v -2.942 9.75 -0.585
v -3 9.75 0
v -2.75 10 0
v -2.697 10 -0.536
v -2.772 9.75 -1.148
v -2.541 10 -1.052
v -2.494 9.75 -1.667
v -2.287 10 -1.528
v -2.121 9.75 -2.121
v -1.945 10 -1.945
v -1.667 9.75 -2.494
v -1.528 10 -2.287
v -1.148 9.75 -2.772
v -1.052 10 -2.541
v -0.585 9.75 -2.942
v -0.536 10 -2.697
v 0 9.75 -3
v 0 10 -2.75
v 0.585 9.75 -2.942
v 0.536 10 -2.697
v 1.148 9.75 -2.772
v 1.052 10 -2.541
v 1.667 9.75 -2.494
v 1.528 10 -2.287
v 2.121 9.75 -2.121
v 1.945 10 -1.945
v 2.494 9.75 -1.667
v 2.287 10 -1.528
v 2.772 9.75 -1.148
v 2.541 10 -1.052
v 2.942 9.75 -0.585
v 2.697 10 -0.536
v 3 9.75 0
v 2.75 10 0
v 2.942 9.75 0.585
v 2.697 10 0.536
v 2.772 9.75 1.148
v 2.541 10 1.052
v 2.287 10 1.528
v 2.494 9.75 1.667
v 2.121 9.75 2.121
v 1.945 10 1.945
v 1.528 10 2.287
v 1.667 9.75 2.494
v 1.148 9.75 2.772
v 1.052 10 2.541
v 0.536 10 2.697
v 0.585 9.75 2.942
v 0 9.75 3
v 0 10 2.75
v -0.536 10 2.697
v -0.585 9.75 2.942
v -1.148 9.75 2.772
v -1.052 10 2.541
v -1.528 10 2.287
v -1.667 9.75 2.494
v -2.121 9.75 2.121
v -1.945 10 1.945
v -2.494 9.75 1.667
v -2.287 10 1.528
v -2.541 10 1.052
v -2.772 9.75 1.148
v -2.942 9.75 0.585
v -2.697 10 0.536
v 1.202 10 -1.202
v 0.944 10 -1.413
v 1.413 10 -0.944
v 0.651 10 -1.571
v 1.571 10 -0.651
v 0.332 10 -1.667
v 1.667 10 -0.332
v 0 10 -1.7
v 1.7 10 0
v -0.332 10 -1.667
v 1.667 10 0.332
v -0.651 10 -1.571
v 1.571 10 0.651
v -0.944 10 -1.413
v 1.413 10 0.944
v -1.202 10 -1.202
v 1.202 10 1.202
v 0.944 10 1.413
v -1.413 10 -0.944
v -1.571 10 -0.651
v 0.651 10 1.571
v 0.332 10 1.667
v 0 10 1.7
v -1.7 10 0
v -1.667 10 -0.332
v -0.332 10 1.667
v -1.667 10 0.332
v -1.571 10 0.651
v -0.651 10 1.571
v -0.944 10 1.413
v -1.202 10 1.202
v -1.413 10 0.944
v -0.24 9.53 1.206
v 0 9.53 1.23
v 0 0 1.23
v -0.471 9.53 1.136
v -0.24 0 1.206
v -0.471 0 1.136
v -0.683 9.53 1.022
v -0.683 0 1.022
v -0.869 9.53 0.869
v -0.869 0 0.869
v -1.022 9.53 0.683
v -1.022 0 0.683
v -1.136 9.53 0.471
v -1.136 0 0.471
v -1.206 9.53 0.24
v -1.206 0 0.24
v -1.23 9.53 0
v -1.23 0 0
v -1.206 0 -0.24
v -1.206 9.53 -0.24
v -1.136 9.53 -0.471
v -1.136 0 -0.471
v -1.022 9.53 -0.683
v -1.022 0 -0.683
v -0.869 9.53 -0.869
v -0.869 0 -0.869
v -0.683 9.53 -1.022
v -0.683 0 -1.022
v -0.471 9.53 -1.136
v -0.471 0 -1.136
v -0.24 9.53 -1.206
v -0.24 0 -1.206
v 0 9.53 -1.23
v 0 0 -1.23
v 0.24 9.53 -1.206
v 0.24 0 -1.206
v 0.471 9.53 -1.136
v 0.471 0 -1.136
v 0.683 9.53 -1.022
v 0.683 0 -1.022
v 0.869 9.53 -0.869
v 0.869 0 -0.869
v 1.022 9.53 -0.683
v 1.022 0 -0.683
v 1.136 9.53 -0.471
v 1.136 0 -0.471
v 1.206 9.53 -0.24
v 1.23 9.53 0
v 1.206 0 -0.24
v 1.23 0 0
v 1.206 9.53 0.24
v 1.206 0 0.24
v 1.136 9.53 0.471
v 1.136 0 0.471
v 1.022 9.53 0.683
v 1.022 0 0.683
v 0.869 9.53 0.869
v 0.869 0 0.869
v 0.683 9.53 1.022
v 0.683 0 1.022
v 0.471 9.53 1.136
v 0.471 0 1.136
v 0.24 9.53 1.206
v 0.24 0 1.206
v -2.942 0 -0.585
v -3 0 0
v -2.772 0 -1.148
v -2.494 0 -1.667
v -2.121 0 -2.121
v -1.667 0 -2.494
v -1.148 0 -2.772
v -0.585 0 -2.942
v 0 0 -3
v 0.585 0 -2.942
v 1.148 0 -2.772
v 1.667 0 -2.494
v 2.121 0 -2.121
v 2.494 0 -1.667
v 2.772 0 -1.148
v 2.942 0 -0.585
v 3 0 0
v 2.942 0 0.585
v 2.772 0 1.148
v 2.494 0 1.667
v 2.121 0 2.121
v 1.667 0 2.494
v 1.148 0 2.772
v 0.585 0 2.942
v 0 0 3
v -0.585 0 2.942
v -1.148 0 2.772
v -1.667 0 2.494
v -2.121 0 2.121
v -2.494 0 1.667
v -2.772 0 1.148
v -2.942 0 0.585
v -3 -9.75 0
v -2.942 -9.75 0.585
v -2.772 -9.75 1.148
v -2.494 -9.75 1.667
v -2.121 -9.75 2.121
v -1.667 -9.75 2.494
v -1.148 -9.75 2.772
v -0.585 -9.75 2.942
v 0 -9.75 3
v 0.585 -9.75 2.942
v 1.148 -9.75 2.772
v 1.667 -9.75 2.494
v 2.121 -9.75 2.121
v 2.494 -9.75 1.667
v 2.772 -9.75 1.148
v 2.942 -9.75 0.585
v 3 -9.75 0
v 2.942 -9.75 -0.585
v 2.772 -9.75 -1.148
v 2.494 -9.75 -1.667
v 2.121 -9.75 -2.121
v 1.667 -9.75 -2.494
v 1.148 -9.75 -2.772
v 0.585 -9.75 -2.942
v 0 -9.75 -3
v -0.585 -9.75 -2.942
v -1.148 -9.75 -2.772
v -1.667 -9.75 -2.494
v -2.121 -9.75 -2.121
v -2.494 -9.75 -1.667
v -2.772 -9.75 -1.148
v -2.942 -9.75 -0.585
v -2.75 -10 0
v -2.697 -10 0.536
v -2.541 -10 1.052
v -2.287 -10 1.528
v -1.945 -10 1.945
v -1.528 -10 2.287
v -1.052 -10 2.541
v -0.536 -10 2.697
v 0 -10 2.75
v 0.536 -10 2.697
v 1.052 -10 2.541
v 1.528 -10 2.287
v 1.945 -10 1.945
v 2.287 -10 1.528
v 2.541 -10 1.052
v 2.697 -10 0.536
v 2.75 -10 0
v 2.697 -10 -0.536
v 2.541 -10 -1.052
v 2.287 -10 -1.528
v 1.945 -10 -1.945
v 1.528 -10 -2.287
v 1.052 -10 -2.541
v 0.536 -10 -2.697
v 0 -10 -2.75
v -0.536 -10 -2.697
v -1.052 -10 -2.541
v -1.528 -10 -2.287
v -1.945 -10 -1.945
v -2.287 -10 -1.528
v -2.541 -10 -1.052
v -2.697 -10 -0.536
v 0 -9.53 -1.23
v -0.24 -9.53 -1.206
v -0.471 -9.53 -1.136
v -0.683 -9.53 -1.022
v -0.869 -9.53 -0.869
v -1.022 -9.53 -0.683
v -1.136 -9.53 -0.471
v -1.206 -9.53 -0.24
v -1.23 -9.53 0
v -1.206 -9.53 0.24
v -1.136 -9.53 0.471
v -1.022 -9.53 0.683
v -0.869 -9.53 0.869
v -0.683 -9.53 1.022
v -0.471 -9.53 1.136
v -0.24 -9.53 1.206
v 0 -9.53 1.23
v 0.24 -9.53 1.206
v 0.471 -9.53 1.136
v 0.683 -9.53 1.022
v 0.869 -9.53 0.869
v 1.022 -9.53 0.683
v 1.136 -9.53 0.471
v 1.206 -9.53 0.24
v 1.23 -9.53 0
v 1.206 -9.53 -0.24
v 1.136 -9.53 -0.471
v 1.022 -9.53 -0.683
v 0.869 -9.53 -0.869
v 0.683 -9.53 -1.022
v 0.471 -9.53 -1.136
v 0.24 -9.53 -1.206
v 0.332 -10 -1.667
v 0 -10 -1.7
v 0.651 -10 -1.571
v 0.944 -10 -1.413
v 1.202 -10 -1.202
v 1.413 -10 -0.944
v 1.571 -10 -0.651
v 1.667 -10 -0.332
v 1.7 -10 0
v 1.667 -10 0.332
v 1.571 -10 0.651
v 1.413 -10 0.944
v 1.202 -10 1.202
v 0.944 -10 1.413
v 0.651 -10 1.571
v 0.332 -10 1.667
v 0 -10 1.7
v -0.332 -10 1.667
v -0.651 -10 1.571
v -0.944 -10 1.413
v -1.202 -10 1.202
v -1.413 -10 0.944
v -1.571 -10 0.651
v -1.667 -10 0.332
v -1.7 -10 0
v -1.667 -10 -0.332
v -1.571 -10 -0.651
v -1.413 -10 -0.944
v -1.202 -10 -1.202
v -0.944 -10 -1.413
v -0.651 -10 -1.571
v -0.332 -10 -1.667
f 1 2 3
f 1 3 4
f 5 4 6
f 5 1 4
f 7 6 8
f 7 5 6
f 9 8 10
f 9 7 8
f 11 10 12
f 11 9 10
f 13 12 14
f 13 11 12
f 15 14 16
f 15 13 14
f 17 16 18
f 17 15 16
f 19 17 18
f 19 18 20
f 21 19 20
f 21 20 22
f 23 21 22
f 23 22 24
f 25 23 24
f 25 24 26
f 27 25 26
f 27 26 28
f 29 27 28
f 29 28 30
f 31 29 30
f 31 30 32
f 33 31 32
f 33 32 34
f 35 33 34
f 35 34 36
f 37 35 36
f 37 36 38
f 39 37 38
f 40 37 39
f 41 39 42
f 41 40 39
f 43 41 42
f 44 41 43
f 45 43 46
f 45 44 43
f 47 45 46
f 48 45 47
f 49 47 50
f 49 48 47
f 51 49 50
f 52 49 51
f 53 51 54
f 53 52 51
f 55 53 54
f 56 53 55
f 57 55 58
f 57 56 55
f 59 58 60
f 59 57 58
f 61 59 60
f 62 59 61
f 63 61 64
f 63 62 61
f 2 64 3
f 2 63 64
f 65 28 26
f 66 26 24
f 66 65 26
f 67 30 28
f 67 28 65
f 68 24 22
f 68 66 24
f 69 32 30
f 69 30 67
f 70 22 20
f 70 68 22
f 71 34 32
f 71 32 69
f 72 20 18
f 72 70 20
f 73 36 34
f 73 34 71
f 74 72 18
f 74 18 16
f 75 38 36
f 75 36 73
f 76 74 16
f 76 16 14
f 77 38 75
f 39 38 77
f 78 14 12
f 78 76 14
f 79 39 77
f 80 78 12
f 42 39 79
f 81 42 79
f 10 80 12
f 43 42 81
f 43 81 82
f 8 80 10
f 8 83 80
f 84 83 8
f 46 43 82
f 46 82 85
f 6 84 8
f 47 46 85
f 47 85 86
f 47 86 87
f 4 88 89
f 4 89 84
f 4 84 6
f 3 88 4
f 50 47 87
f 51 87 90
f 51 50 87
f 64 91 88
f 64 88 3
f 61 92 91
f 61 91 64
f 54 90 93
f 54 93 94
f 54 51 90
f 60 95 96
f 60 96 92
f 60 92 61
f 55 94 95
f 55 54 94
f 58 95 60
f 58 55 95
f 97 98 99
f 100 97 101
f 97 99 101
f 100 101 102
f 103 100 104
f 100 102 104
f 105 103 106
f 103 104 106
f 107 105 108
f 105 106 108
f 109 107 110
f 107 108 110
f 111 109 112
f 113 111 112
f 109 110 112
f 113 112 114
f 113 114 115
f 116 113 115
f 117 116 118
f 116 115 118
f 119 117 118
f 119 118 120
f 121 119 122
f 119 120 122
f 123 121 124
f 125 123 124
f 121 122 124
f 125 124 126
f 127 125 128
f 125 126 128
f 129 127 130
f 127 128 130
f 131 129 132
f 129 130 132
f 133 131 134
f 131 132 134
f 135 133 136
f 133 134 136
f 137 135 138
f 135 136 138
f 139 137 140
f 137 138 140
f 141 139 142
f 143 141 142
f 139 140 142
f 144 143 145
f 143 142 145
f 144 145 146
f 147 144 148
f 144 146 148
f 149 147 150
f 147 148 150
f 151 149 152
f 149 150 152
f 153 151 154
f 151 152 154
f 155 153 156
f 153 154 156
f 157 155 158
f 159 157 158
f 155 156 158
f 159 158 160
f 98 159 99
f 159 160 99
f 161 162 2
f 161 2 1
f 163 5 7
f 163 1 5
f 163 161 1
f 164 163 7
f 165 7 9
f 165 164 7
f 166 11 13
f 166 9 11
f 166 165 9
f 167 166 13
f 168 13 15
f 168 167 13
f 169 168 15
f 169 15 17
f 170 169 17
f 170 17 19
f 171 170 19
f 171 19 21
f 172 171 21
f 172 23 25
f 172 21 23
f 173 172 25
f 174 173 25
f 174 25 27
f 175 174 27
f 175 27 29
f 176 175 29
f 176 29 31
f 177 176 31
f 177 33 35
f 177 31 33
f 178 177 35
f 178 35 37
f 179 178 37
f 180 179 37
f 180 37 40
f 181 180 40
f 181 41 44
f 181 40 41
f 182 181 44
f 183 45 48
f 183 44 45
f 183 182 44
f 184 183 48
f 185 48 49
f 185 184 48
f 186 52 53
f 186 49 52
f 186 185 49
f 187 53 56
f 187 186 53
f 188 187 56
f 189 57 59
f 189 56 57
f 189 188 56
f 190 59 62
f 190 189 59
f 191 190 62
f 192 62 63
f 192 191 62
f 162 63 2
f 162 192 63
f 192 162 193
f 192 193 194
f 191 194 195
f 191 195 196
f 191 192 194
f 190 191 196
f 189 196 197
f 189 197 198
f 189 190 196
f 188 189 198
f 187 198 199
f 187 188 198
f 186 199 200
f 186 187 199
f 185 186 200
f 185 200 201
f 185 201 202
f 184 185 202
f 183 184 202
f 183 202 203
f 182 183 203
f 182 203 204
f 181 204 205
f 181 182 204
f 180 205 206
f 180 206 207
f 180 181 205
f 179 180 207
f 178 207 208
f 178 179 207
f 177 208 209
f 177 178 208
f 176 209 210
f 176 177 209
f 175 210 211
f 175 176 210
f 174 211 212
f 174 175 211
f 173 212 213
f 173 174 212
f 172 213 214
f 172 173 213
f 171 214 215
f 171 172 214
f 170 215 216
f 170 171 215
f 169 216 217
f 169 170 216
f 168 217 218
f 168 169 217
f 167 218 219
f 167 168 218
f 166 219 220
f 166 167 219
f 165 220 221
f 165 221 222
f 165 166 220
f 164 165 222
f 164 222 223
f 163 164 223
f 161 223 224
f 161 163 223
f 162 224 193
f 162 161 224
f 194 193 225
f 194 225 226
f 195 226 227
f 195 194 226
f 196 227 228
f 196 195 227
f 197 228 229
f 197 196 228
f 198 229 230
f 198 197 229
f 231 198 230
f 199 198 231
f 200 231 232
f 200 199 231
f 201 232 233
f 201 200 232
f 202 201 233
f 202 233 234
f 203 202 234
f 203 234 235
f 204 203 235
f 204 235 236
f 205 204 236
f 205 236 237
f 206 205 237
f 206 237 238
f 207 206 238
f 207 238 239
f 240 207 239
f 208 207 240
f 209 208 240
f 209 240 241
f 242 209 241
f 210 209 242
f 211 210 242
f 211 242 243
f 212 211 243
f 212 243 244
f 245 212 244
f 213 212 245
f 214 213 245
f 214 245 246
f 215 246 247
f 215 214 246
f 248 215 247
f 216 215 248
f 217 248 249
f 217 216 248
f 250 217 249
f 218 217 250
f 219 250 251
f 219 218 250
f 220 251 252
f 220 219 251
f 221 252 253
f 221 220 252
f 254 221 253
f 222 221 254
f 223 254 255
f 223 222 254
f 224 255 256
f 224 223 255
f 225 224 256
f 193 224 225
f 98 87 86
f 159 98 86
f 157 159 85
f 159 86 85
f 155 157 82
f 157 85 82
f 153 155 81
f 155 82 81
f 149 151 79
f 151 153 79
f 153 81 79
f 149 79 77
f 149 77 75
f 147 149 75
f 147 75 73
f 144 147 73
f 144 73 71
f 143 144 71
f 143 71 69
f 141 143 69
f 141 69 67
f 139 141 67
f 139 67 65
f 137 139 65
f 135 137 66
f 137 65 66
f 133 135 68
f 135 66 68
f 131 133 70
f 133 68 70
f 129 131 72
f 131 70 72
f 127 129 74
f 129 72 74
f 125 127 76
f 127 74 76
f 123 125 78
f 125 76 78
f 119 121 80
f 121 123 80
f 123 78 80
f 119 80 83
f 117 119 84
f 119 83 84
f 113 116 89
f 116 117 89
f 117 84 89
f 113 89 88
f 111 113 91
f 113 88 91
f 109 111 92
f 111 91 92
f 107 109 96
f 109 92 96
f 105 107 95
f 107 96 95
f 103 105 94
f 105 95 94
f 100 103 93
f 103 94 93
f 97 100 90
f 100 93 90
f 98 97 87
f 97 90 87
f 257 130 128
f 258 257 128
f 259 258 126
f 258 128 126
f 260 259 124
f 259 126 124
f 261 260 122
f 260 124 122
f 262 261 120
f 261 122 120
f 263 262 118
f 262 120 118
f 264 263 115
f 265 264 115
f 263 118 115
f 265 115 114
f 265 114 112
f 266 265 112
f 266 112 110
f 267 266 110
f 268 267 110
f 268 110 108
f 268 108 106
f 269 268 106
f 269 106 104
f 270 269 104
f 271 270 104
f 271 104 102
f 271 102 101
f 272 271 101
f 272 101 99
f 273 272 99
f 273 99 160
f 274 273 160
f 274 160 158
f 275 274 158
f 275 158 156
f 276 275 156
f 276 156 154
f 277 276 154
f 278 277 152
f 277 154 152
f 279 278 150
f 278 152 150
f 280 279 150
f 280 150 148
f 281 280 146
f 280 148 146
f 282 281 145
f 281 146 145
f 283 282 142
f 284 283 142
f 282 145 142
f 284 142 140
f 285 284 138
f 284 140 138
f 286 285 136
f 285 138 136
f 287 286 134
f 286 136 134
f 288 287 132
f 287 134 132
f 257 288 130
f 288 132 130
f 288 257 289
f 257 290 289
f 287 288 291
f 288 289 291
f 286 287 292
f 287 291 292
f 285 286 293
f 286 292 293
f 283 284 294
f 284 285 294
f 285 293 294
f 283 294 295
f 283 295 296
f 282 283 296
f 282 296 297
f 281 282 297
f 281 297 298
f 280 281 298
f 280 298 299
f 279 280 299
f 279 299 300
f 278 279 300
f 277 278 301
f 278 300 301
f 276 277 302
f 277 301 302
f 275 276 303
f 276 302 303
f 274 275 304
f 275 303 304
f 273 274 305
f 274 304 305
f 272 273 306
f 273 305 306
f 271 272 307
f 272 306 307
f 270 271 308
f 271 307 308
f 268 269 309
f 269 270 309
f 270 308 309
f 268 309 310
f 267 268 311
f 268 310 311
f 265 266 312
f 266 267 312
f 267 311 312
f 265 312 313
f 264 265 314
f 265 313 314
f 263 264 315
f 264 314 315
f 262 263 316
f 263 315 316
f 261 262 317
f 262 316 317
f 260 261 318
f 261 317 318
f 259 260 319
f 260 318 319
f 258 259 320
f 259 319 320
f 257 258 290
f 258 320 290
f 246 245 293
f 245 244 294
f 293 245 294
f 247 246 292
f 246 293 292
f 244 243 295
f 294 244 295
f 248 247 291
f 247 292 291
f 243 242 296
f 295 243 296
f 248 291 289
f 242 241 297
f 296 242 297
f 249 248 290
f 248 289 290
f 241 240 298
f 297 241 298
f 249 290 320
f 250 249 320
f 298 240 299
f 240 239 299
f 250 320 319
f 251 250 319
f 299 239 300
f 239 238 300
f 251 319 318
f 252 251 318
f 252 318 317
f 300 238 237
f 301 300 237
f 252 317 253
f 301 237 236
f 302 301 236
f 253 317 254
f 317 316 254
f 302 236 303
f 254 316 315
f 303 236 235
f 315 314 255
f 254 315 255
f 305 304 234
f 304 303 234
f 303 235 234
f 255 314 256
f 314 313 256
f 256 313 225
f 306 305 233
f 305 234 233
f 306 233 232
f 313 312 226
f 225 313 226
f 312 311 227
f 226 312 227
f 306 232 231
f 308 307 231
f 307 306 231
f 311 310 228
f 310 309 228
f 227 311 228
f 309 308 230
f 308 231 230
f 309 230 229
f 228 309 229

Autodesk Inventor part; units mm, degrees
ref_plane "YZ Plane" through (0, 0, 0) normal (1, 0, 0) x (0, 1, 0)
ref_plane "XZ Plane" through (0, 0, 0) normal (0, 1, 0) x (-1, 0, 0)
ref_plane "XY Plane" through (0, 0, 0) normal (0, 0, 1) x (1, 0, 0)
sketch "スケッチ1" plane through (0, 0, 0) normal (0, 1, 0) x (-1, 0, 0)
  circle A0 centre (0, 0) radius 3
  dimension "d0" = 6
extrude "押し出し1" add sketch "スケッチ1" along normal mid plane 20
sketch "スケッチ2" plane through (0, 10, 0) normal (0, 1, 0) x (1, 0, 0)
  point P0 (0, 0)
  point P1 (0, 0)
hole "穴1" at (0, 10, 0) direction (0, -1, 0) diameter 2.459 depth 10 countersink diameter 3.4 countersink angle 90 thread size "M3x0.5" class "6H" standard "ISO Metric profile"
sketch "スケッチ3" plane through (0, -10, 0) normal (0, -1, 0) x (1, 0, 0)
  point P0 (0, 0)
  point P1 (0, 0)
hole "穴2" at (0, -10, 0) direction (0, 1, 0) diameter 2.459 depth 10 countersink diameter 3.4 countersink angle 90 thread size "M3x0.5" class "6H" standard "ISO Metric profile"
chamfer "面取り1" distance 0.25 angle 45 2 edges at (3, -10, 0) (3, 10, 0)
properties part number "Spacer_M3D6L60" material "アルミニウム 6061"
